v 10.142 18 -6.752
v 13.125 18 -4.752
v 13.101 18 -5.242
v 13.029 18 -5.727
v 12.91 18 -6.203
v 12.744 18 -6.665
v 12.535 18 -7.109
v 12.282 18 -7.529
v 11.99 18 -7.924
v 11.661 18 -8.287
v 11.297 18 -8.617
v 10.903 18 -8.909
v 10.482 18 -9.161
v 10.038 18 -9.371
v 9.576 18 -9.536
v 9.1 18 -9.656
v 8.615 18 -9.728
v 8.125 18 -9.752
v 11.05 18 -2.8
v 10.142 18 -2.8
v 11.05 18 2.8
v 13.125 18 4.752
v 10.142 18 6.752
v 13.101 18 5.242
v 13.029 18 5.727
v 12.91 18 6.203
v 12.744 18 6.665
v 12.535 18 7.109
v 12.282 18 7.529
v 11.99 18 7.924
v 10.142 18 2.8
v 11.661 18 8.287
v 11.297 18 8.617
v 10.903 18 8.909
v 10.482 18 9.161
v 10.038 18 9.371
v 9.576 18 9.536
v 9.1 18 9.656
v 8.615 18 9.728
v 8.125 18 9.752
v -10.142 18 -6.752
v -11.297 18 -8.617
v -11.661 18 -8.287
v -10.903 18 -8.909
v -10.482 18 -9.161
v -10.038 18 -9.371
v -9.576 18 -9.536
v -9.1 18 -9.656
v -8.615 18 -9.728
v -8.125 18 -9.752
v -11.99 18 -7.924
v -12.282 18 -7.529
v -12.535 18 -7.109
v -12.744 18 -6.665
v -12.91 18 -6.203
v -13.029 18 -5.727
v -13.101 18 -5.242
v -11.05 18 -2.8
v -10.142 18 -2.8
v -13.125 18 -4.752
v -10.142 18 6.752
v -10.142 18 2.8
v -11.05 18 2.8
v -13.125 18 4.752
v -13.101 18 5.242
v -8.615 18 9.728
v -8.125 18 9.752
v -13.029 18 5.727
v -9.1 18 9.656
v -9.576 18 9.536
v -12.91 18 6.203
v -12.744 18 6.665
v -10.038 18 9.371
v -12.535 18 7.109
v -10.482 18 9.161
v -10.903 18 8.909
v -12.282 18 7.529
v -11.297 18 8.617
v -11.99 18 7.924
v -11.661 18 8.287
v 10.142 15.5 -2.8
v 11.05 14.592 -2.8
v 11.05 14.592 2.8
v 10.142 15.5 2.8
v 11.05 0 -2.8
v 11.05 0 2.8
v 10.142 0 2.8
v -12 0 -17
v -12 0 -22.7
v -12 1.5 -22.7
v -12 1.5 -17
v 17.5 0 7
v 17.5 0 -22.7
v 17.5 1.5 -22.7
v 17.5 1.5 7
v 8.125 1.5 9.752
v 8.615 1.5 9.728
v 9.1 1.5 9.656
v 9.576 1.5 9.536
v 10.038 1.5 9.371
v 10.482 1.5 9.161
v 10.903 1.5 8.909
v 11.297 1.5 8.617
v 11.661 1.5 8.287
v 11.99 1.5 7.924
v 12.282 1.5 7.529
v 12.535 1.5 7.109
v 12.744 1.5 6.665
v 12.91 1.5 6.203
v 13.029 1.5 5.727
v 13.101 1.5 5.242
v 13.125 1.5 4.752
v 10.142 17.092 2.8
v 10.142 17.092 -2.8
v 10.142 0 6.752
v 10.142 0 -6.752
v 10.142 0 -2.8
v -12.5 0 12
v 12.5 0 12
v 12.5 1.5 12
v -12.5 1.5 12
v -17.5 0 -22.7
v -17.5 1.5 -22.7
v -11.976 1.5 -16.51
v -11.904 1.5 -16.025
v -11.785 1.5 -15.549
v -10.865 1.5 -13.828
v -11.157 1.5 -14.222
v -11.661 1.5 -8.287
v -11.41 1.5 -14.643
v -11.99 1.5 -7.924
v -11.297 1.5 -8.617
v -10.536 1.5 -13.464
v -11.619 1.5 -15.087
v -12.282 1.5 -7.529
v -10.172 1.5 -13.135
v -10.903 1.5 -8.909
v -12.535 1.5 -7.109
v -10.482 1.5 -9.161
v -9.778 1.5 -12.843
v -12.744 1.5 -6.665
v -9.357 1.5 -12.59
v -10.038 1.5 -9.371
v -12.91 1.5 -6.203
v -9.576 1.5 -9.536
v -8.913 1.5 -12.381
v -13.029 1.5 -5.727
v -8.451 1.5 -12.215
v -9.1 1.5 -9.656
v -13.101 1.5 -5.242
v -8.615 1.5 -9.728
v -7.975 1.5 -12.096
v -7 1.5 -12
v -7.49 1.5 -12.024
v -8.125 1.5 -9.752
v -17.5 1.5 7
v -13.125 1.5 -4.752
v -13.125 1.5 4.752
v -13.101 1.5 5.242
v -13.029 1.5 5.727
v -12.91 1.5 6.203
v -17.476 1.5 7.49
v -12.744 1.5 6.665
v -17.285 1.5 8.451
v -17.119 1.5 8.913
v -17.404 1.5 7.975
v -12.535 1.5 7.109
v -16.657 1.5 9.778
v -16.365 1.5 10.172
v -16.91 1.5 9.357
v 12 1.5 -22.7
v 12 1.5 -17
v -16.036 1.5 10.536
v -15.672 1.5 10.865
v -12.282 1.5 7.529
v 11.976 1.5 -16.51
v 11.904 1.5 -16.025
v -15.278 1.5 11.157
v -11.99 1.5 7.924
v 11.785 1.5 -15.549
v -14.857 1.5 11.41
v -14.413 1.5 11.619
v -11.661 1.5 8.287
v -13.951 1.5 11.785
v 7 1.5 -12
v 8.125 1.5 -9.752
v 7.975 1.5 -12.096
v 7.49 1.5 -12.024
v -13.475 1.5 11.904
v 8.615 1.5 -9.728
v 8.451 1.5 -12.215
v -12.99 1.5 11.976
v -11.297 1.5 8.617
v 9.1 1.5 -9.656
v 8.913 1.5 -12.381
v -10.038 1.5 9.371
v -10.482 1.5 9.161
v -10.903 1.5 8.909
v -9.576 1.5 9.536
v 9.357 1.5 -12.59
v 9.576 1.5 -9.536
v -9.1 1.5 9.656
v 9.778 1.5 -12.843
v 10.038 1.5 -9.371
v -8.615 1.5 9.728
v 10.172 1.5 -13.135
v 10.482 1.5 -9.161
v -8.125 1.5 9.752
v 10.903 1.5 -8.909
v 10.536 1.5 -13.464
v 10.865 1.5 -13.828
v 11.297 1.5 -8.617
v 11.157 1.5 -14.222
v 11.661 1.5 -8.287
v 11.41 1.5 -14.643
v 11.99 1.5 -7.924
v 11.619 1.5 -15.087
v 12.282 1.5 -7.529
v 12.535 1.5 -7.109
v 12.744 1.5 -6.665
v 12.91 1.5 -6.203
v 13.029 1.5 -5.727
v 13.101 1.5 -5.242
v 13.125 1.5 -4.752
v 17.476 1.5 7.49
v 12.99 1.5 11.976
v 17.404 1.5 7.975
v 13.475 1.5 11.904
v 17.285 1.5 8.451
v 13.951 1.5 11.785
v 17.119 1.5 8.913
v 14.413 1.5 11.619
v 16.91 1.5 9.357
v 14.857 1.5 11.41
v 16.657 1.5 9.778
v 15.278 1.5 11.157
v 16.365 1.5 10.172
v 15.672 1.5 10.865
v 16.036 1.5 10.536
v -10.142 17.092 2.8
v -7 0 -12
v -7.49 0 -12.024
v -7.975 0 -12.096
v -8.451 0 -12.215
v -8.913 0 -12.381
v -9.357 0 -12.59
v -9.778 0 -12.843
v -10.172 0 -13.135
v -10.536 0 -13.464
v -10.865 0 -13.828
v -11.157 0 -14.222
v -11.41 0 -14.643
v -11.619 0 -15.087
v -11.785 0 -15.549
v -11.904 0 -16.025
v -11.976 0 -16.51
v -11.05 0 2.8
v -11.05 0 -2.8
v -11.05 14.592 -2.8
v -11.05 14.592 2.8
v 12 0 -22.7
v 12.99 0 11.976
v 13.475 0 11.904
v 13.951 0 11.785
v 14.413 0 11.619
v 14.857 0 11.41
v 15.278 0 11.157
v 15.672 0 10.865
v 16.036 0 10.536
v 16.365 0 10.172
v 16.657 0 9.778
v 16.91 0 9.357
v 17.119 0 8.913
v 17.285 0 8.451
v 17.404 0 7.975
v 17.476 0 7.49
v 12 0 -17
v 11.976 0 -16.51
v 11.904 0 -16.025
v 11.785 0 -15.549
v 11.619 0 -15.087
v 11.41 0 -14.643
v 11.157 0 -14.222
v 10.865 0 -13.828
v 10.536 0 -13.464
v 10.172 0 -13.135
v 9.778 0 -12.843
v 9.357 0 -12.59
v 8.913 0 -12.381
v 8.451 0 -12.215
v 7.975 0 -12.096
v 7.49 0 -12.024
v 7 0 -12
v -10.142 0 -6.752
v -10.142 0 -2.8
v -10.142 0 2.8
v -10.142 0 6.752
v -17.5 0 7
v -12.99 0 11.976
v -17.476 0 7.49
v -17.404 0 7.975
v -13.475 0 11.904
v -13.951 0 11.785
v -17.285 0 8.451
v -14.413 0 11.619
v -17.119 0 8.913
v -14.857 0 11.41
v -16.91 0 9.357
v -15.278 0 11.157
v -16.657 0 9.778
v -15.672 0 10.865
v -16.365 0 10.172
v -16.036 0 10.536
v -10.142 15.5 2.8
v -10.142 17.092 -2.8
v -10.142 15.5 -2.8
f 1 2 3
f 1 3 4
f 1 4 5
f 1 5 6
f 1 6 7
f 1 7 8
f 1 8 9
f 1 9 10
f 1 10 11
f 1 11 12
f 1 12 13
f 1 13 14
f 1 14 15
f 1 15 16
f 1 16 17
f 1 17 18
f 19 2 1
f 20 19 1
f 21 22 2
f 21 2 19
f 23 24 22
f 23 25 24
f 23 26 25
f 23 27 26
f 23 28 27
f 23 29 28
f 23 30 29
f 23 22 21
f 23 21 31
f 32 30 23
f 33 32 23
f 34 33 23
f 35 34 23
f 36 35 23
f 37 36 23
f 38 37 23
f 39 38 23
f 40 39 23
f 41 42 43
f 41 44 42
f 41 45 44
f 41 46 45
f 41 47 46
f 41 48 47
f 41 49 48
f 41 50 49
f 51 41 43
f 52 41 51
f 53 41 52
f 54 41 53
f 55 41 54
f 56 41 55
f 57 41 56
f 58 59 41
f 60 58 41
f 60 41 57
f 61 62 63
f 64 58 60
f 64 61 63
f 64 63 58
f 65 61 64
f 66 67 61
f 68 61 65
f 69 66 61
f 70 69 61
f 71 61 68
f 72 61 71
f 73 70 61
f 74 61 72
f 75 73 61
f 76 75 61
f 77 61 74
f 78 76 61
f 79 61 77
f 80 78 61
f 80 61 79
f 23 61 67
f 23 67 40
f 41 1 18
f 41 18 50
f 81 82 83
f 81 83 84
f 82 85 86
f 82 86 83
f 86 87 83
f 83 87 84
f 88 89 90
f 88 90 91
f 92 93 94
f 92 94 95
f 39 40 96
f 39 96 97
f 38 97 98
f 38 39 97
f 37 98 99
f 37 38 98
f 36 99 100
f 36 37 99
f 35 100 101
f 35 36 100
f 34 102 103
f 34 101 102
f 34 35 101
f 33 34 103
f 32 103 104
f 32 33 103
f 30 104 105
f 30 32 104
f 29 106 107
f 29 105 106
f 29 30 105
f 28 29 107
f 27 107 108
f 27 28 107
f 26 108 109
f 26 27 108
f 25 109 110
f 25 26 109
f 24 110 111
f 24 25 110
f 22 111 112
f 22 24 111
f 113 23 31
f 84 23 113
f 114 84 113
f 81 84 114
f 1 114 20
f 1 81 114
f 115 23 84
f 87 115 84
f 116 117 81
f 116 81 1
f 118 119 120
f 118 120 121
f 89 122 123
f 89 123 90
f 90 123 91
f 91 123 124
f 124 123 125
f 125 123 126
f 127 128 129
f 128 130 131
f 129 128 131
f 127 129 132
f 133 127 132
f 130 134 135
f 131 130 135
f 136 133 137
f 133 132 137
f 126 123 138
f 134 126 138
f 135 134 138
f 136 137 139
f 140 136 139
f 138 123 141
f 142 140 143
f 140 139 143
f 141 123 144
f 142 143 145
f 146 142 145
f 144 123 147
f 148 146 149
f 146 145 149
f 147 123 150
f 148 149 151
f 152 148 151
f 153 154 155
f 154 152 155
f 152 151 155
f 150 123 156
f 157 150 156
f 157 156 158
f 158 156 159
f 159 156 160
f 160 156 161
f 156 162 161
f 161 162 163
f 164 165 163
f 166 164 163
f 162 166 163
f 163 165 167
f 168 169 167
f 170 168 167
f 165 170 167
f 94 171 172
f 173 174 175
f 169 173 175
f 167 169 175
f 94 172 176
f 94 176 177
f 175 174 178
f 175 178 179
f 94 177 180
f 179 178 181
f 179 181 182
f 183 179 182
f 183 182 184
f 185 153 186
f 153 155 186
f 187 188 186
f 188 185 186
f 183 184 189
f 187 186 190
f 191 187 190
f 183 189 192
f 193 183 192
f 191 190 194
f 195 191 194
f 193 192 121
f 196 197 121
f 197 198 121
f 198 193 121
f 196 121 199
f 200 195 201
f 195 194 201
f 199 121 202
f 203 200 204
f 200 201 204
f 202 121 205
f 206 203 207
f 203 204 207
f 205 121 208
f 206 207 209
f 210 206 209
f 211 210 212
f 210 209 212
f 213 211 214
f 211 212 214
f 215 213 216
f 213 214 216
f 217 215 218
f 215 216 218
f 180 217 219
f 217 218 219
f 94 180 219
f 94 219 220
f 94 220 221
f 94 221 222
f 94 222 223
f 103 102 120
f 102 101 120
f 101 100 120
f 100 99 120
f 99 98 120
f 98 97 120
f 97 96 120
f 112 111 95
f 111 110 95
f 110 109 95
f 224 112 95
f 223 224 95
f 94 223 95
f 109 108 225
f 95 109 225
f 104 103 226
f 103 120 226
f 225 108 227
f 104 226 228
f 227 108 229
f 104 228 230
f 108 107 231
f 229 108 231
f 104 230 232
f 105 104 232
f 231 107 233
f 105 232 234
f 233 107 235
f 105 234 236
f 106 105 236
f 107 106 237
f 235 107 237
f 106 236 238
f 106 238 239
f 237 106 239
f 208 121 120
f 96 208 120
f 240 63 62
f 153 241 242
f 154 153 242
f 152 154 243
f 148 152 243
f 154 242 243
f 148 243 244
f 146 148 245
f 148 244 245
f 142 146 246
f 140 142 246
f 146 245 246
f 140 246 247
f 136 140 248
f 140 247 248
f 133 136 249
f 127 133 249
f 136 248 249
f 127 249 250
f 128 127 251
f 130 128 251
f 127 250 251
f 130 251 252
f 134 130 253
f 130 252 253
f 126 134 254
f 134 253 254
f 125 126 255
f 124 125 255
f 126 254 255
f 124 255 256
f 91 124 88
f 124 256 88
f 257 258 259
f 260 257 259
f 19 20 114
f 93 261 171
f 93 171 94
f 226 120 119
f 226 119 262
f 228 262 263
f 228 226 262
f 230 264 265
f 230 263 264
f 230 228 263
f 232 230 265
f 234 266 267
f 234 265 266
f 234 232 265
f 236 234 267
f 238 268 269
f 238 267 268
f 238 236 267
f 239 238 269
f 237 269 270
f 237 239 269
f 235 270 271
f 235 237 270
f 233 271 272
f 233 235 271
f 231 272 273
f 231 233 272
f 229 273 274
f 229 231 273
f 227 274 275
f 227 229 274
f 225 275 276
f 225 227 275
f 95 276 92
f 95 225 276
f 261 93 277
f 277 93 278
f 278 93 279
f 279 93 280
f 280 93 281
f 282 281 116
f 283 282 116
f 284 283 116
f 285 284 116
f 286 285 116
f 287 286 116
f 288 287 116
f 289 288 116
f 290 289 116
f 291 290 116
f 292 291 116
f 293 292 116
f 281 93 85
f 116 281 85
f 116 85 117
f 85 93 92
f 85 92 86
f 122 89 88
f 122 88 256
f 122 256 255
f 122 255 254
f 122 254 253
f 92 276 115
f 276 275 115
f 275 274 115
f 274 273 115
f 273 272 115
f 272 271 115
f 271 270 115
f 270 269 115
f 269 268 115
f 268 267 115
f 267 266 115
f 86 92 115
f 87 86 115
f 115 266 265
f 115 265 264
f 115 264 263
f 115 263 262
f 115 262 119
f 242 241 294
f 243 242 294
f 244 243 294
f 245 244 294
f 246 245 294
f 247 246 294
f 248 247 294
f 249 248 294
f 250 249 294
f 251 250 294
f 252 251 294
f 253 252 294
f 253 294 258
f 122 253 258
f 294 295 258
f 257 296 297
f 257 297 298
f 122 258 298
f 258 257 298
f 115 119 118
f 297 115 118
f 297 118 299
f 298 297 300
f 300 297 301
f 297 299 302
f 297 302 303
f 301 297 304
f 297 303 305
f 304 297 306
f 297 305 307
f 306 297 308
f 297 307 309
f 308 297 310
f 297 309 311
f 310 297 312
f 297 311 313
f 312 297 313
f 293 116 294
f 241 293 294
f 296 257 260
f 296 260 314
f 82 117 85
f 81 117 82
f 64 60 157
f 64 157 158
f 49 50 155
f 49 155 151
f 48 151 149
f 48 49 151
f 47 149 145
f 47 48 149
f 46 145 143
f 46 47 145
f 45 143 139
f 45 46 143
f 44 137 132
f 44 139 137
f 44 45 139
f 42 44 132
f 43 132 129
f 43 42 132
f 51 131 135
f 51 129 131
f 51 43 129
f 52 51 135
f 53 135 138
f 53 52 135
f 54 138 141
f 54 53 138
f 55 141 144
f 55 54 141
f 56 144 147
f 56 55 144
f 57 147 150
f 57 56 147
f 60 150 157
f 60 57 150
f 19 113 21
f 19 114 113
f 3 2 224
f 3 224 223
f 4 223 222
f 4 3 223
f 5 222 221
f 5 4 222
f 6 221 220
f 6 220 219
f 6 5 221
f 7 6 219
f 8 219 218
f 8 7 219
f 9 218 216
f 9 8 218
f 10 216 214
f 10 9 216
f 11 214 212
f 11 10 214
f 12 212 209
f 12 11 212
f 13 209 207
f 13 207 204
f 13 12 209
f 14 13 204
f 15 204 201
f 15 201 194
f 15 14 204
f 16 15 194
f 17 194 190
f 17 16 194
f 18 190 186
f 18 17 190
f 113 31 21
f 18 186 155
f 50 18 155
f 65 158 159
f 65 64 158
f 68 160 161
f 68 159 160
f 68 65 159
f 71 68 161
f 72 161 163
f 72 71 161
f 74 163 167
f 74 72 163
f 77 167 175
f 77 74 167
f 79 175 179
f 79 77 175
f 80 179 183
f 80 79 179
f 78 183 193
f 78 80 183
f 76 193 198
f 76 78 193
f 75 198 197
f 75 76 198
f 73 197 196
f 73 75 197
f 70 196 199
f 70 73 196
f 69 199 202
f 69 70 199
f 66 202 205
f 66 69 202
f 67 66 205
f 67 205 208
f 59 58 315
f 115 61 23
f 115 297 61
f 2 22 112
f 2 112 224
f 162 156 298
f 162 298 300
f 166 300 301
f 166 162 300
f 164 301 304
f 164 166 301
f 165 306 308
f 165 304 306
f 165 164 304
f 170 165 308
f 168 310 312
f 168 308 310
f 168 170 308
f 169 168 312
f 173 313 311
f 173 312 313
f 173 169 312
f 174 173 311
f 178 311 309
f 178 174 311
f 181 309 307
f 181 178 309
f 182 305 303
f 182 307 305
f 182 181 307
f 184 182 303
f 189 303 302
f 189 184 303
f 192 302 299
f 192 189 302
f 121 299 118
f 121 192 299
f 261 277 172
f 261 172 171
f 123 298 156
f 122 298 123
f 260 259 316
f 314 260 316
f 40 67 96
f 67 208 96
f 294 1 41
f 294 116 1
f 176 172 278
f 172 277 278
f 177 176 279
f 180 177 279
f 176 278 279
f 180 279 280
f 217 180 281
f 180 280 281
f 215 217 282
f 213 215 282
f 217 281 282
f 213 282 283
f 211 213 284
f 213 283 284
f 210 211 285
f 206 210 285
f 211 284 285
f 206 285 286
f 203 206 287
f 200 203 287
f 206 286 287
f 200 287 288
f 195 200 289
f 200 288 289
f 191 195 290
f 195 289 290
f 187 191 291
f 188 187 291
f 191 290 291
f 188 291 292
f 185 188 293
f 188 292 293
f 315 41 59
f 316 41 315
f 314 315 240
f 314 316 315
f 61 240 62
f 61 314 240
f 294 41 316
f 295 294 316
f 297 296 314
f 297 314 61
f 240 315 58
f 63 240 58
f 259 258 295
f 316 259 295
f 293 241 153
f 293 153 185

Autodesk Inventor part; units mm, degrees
ref_plane "YZ Plane" through (0, 0, 0) normal (1, 0, 0) x (0, 1, 0)
ref_plane "XZ Plane" through (0, 0, 0) normal (0, 1, 0) x (-1, 0, 0)
ref_plane "XY Plane" through (0, 0, 0) normal (0, 0, 1) x (1, 0, 0)
sketch "Sketch1" plane through (0, 0, 0) normal (0, 1, 0) x (-1, 0, 0)
  line L0 (-10.1425, -6.7516) -> (10.1425, -6.7516)
  line L1 (10.1425, -6.7516) -> (10.1425, 6.7516)
  line L2 (10.1425, 6.7516) -> (-10.1425, 6.7516)
  line L3 (-10.1425, 6.7516) -> (-10.1425, -6.7516)
  line L4 (-10.1425, -6.7516) -> (10.1425, 6.7516) construction
  line L5 (10.1425, -6.7516) -> (-10.1425, 6.7516) construction
  line L6 (-13.125, -9.7516) -> (13.125, -9.7516)
  line L7 (13.125, -9.7516) -> (13.125, 9.7516)
  line L8 (13.125, 9.7516) -> (-13.125, 9.7516)
  line L9 (-13.125, 9.7516) -> (-13.125, -9.7516)
  point P0 (0, 0)
  point P1 (0, 0)
  point P2 (0, 0)
  point P3 (0, -9.7516)
  point P4 (0, 0)
  point P5 (-13.125, 0)
  point P6 (0, 0)
  dimension "d2" = 19.685
  dimension "d3" = 12.9032
  dimension "d4" = 3
  dimension "d12" = 26.25
extrude "Extrusion1" add sketch "Sketch1" along normal blind 18
sketch "Sketch2" plane through (0, 0, 0) normal (0, -1, 0) x (1, 0, 0)
  line L0 (10.1425, 6.7516) -> (10.1425, -6.7516) projected
  line L1 (10.1425, -6.7516) -> (-10.1425, -6.7516) projected
  line L2 (-10.1425, -6.7516) -> (-10.1425, 6.7516) projected
  line L3 (-10.1425, 6.7516) -> (10.1425, 6.7516) projected
  line L4 (17.5, -22.7) -> (17.5, 12)
  line L5 (17.5, 12) -> (-17.5, 12)
  line L6 (-17.5, 12) -> (-17.5, -22.7)
  line L7 (13.125, -9.7516) -> (-13.125, -9.7516) projected
  line L8 (-13.125, 9.7516) -> (13.125, 9.7516) projected
  line L9 (-13.125, -9.7516) -> (-13.125, 9.7516) projected
  line L10 (-12, -22.7) -> (-12, -17)
  line L11 (-7, -12) -> (7, -12)
  line L12 (12, -17) -> (12, -22.7)
  line L13 (0, -23.1968) -> (0, 12) construction
  line L14 (-17.5, -22.7) -> (-12, -22.7)
  line L15 (12, -22.7) -> (17.5, -22.7)
  arc A0 (-7, -12) -> (-12, -17) centre (-7, -17) ccw
  arc A1 (12, -17) -> (7, -12) centre (7, -17) ccw
  point P0 (0, 0)
  point P1 (0, 0)
  point P2 (-12, -12)
  point P3 (12, -12)
  dimension "d8" = 35
  dimension "d13" = 12
  dimension "d15" = 2.2484
  dimension "d16" = 2.2484
  dimension "d17" = 22.7
  dimension "d18" = 24
  dimension "d32" = 34.7
  dimension "d33" = 5
extrude "Extrusion2" add sketch "Sketch2" against normal blind 1.5
sketch "Sketch3" plane through (0, 0, 0) normal (0, 0, 1) x (1, 0, 0)
  line L0 (-13.125, 1.5) -> (-13.125, 18) projected
  line L1 (13.125, 18) -> (-13.125, 18) projected
  line L2 (-10.1425, 0) -> (-10.1425, 18) projected
  line L3 (10.1425, 0) -> (10.1425, 18) projected
  line L4 (13.125, 1.5) -> (13.125, 18) projected
  line L5 (7, 0) -> (-7, 0) projected
  line L6 (-11.05, 0) -> (-11.05, 14.5925)
  line L7 (-11.05, 14.5925) -> (-10.1425, 15.5)
  line L8 (11.05, 0) -> (11.05, 14.5925)
  line L9 (11.05, 14.5925) -> (10.1425, 15.5)
  line L10 (0, 18) -> (0, 0) construction
  line L11 (-10.1425, 17.0925) -> (-11.05, 18)
  line L12 (-11.05, 14.5925) -> (-11.05, 18) construction
  line L13 (10.1425, 17.0925) -> (11.05, 18)
  line L14 (11.05, 18) -> (11.05, 14.5925) construction
  line L15 (-10.1425, 0) -> (-11.05, 0)
  line L16 (10.1425, 0) -> (11.05, 0)
  line L17 (-10.1425, 15.5) -> (-10.1425, 0)
  line L18 (10.1425, 0) -> (10.1425, 15.5)
  line L19 (10.1425, 17.0925) -> (10.1425, 18)
  line L20 (10.1425, 18) -> (11.05, 18)
  line L21 (-11.05, 18) -> (-10.1425, 18)
  line L22 (-10.1425, 18) -> (-10.1425, 17.0925)
  dimension "d21" = 2.5
  dimension "d22" = 21.5
  dimension "d24" = 45
  dimension "d34" = 20.285
extrude "Extrusion3" cut sketch "Sketch3" along normal mid plane 5.6
fillet "Fillet1" radius 5 2 edges at (17.5, 0.75, 12) (-17.5, 0.75, 12)
fillet "Fillet2" radius 5 4 edges at (13.125, 9.75, 9.7516) (13.125, 9.75, -9.7516) (-13.125, 9.75, 9.7516) (-13.125, 9.75, -9.7516)
equation "\"d15\" = d16"
properties part number "Switch Holder"
